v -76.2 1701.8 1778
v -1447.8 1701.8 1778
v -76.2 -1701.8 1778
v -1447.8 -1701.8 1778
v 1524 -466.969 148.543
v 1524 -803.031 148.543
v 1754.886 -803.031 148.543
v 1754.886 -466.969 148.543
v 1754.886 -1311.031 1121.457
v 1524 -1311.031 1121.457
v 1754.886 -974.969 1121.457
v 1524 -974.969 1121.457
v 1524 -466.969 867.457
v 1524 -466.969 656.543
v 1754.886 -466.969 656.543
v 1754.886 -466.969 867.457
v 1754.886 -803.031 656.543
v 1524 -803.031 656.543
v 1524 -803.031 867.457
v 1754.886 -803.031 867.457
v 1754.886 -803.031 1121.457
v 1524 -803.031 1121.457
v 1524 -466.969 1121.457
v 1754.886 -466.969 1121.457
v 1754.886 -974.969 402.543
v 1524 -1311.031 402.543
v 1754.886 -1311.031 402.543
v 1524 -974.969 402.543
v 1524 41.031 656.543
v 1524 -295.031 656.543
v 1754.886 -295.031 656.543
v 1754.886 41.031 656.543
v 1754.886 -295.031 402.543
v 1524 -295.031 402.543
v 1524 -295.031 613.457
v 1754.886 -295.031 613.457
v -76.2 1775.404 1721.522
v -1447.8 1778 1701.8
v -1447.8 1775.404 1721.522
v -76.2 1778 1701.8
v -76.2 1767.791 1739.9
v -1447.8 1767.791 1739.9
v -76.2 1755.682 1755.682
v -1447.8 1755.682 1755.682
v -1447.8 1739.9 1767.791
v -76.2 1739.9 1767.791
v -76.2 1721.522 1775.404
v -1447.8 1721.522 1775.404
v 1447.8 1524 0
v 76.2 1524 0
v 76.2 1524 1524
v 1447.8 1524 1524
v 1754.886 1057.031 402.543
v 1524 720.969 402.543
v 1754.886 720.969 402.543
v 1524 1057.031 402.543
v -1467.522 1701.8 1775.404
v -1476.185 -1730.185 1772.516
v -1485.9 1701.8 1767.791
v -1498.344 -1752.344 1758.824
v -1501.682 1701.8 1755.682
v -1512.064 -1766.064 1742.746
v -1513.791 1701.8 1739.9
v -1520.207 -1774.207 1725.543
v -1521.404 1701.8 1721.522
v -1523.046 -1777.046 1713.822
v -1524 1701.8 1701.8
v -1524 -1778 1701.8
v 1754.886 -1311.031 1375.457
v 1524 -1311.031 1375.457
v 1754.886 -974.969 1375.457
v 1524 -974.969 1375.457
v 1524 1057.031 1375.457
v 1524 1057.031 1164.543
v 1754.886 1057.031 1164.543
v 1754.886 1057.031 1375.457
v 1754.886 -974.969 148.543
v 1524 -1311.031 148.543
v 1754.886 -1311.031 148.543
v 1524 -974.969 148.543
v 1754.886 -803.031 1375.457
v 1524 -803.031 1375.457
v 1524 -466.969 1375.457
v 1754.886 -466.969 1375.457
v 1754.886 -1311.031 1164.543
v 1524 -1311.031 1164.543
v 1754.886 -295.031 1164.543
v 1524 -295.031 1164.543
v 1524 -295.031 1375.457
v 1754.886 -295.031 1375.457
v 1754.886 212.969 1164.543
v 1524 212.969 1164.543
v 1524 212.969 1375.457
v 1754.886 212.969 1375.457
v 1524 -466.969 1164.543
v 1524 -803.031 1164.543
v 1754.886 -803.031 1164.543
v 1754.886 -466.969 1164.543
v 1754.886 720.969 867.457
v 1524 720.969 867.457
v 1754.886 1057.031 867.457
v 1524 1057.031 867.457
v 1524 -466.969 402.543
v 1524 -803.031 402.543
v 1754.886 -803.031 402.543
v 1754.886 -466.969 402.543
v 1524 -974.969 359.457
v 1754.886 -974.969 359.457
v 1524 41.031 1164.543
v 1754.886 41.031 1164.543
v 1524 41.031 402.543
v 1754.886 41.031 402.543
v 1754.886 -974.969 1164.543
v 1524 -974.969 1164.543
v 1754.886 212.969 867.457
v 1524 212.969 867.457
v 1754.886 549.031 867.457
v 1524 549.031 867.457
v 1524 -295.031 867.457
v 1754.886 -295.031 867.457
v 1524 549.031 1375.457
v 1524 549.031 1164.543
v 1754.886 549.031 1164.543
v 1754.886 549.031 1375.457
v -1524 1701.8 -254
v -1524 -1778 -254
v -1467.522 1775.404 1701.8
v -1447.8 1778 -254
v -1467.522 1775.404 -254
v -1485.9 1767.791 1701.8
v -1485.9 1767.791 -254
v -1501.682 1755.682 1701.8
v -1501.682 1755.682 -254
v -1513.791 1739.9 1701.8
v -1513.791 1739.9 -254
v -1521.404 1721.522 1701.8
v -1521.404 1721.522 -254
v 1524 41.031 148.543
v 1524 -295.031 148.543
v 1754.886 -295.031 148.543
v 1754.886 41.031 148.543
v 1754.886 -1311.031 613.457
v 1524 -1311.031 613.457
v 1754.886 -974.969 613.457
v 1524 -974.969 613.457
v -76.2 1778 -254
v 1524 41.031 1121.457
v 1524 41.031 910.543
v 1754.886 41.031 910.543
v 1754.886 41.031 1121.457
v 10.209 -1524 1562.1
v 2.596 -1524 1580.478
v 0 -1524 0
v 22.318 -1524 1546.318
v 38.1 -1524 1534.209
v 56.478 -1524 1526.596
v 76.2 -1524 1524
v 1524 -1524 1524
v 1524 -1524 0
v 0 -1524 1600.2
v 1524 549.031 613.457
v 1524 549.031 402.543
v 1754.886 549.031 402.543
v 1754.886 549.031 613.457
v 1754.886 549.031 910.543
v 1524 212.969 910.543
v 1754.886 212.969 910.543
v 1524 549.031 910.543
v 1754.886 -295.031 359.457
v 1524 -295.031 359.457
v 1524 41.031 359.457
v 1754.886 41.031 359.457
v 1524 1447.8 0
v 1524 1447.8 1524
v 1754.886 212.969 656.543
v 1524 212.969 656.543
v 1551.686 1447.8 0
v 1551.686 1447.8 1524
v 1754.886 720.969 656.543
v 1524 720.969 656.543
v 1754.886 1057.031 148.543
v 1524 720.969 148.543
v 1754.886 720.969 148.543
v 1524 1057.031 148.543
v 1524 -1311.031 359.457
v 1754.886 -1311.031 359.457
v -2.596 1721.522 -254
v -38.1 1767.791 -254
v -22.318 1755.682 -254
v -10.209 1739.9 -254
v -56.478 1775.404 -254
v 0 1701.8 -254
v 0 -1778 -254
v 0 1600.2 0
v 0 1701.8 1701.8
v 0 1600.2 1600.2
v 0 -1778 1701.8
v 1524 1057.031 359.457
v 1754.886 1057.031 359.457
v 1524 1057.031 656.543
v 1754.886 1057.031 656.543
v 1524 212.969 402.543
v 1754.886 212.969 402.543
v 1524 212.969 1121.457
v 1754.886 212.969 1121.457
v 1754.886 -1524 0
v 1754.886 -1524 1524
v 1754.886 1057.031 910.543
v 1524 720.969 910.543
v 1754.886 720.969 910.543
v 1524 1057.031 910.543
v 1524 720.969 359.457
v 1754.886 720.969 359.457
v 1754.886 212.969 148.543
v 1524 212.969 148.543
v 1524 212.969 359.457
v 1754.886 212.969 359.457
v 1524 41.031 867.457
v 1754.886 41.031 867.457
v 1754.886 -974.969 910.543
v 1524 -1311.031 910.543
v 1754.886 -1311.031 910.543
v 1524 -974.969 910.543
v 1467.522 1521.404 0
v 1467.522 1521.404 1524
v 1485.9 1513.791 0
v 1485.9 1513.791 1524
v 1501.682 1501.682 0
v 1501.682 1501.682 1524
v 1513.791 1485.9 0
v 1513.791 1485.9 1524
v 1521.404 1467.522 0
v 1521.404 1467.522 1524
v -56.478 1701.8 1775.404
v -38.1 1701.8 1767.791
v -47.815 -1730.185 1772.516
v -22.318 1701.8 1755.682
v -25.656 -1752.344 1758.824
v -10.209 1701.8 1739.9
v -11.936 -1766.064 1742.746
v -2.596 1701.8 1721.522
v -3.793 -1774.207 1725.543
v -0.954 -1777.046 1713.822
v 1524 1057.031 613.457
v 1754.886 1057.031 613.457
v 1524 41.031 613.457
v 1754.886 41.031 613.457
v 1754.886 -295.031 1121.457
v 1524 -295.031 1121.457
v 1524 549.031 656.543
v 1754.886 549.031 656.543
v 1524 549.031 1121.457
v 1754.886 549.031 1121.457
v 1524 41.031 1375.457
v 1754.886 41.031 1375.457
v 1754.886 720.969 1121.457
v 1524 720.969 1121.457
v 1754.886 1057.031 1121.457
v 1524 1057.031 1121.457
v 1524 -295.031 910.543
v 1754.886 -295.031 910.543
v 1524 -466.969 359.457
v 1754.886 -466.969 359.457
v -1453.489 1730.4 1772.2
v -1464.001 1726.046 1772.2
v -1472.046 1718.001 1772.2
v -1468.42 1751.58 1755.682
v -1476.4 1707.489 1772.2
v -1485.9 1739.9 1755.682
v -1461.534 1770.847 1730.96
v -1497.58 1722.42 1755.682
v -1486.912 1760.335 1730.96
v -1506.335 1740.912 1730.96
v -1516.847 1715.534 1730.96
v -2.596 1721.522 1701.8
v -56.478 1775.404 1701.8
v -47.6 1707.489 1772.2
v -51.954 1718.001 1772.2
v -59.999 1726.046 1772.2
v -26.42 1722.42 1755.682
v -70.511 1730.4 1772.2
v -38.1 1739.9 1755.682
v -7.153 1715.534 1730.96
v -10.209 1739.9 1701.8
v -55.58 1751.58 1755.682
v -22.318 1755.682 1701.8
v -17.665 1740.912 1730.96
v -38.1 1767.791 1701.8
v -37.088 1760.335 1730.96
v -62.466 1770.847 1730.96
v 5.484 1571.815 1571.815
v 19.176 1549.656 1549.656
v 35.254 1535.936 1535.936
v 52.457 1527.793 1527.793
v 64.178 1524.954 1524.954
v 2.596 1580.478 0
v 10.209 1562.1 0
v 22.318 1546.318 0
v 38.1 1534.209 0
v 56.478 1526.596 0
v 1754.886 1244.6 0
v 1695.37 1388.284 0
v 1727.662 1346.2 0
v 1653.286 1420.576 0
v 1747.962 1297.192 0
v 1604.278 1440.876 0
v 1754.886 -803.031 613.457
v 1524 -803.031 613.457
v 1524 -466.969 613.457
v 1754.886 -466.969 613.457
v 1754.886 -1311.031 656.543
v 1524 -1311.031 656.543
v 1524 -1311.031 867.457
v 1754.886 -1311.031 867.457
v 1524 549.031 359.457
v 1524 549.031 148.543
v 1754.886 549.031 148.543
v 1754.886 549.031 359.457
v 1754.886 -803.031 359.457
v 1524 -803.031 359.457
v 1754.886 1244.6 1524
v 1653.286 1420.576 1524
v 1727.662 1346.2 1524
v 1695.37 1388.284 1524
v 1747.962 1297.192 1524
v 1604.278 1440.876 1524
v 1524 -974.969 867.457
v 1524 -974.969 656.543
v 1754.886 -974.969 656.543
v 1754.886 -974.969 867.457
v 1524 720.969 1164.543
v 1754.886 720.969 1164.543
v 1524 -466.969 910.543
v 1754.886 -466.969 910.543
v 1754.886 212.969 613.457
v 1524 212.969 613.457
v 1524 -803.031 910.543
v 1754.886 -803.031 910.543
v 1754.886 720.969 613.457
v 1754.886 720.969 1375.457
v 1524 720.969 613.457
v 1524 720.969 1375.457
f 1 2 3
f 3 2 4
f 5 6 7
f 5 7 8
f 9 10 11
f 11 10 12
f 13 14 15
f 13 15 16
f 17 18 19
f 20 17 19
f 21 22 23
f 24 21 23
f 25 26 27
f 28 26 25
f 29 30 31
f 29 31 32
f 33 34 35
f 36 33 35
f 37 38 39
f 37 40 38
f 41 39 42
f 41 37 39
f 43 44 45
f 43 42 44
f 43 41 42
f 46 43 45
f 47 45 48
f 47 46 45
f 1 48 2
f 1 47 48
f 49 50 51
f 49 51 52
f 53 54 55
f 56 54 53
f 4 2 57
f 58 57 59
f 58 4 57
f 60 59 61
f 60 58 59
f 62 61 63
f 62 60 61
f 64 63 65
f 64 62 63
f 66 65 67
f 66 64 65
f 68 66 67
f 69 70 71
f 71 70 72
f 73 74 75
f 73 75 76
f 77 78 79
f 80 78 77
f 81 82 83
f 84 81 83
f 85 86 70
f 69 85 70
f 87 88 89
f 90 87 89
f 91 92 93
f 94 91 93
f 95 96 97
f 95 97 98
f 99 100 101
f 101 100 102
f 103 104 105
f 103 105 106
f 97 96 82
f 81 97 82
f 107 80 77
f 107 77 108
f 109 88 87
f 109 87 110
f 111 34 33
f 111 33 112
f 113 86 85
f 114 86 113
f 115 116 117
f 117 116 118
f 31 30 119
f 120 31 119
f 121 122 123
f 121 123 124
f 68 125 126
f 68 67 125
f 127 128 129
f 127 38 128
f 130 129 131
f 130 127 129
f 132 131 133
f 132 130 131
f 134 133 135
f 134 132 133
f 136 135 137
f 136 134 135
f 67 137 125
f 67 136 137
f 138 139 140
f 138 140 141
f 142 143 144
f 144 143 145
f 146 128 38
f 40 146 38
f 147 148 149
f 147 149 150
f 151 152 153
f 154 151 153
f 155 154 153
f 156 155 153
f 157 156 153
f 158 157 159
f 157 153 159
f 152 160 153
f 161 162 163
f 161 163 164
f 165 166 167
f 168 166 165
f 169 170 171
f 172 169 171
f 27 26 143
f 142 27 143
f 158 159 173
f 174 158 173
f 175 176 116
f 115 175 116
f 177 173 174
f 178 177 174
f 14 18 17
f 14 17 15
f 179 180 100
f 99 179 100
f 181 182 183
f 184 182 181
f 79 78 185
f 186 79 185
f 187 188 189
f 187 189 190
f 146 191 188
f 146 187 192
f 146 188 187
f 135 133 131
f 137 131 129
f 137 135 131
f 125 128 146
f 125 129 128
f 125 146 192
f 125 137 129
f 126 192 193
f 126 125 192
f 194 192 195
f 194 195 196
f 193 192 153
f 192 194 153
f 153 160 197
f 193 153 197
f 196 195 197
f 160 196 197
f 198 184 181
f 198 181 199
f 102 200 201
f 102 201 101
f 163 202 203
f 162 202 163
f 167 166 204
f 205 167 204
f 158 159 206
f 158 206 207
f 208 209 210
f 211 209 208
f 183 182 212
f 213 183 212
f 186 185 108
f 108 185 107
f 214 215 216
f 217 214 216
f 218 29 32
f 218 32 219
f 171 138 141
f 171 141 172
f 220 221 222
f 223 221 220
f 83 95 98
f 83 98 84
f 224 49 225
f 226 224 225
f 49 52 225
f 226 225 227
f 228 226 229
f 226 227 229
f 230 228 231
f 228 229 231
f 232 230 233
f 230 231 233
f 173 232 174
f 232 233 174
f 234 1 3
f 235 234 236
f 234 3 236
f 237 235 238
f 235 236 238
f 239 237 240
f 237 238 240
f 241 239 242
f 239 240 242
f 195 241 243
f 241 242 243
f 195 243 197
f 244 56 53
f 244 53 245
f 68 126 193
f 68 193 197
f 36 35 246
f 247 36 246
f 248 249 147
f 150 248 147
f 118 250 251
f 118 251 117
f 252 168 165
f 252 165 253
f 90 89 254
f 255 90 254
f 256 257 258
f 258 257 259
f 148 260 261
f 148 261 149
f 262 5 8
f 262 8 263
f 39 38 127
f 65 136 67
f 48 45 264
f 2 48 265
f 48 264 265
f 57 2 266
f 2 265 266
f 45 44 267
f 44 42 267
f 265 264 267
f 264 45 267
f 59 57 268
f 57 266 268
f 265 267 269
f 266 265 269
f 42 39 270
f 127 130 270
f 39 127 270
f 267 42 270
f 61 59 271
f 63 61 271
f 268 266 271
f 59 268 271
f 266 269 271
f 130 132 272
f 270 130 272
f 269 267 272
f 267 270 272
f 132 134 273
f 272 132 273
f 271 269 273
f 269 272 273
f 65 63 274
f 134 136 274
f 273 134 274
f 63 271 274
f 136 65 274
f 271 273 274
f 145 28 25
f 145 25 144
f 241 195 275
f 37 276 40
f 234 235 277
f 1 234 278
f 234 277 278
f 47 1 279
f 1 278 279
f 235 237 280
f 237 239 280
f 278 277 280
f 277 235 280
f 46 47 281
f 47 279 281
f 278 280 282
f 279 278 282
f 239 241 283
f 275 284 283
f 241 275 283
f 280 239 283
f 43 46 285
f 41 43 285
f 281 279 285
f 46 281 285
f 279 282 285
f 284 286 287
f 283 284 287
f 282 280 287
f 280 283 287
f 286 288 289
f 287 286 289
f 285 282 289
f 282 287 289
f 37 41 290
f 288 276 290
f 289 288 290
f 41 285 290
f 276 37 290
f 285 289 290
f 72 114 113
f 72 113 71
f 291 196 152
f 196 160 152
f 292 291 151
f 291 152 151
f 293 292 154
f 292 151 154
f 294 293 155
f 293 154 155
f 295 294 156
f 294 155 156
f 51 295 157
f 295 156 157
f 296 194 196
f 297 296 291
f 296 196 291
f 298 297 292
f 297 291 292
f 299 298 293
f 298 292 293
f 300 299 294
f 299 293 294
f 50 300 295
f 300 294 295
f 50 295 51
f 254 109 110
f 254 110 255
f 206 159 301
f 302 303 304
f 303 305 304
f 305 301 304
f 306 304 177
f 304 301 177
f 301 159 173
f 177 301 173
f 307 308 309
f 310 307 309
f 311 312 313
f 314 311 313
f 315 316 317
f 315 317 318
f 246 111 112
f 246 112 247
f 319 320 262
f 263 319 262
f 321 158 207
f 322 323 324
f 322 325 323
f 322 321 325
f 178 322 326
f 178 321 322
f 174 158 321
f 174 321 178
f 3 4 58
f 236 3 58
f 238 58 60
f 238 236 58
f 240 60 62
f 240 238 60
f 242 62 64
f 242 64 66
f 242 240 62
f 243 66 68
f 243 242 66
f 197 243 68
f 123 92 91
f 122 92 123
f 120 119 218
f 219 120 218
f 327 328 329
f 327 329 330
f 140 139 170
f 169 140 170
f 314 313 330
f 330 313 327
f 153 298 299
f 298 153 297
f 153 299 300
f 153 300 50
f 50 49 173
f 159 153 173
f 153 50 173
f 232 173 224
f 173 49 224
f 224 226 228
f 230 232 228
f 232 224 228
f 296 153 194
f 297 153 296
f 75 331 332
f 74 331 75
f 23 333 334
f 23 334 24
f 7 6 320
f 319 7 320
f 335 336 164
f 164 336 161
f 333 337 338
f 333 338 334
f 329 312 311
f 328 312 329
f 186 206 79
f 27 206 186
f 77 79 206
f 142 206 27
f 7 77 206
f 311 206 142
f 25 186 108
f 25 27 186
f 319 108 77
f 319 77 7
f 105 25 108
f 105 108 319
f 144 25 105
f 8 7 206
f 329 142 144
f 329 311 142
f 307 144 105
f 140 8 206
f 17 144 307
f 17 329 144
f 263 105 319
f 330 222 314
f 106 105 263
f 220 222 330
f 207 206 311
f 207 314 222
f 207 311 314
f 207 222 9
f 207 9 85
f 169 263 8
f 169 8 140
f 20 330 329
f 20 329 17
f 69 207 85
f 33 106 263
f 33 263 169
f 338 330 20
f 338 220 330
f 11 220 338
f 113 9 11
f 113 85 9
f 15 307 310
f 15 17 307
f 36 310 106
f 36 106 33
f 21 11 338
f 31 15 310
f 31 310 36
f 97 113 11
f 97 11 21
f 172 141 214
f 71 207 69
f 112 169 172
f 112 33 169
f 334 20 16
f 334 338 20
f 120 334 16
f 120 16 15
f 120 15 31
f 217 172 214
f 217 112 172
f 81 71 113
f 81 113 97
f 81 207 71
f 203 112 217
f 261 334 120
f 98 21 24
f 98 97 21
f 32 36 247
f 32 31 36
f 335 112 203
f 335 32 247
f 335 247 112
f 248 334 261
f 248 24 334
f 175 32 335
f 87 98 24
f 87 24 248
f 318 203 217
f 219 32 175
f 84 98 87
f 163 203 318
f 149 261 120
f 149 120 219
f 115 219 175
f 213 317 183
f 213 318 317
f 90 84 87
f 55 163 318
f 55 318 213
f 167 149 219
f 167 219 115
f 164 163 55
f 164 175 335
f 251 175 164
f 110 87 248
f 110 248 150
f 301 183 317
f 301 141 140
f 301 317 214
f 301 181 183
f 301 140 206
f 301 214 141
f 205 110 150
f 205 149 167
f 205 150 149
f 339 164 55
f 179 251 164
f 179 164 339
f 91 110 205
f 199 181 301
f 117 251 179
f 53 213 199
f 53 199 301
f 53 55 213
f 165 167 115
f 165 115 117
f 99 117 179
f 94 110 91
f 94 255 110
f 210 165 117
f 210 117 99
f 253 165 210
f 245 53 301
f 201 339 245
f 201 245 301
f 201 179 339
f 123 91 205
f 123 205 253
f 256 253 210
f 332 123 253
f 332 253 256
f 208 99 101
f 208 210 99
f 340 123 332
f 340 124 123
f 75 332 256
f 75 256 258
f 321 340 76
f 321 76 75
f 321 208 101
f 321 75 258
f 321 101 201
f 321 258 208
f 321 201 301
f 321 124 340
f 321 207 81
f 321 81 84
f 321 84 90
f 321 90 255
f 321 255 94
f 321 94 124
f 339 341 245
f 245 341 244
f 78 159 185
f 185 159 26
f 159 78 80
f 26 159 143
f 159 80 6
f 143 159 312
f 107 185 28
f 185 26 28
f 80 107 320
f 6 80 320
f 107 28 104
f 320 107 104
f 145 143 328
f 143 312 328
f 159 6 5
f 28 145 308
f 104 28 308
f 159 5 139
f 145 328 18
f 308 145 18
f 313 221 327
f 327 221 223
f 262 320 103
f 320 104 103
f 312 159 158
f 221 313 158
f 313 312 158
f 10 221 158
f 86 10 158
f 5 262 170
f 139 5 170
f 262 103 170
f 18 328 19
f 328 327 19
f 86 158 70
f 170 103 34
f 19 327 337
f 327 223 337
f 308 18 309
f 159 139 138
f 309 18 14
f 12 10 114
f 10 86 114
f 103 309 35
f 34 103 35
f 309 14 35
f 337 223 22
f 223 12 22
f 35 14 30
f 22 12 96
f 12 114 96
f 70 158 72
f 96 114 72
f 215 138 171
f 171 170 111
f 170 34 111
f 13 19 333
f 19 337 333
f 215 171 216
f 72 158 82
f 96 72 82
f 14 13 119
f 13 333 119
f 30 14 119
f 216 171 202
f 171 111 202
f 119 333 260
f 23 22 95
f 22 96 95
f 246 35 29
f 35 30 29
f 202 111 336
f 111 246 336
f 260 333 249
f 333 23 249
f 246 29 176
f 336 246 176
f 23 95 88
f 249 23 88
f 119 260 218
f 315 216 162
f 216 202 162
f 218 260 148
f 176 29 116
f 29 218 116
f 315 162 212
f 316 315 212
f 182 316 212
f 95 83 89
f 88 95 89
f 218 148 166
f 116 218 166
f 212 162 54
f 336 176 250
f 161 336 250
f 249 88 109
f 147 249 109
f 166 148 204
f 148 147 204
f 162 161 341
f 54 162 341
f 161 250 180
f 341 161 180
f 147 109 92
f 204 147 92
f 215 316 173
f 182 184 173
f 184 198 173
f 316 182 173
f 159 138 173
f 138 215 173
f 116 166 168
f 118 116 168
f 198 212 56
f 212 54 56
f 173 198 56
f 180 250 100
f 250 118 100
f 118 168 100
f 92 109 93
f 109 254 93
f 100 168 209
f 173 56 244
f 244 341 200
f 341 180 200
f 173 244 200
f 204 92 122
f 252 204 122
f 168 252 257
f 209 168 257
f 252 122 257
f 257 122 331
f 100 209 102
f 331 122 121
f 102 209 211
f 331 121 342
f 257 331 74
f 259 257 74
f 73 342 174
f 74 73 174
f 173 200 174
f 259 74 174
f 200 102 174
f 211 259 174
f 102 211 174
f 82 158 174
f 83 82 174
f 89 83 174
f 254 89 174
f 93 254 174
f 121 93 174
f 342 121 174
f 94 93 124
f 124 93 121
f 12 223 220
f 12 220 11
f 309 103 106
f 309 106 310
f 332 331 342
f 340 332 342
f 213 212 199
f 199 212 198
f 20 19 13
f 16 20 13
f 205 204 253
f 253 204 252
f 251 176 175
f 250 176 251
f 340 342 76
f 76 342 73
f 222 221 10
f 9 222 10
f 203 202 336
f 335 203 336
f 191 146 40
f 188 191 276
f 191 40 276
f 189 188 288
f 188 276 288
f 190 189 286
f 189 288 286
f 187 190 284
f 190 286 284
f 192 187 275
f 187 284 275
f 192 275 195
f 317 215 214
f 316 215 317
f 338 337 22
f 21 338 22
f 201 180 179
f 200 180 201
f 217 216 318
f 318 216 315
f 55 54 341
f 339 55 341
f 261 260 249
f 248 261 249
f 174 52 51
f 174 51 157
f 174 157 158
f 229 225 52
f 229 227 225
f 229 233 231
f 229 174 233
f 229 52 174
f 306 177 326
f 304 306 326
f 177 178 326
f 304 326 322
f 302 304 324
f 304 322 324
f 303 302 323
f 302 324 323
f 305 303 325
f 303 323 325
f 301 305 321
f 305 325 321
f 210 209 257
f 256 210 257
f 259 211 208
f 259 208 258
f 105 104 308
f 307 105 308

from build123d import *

# Parameters (mm, degrees)
F0_W     = 3048
F0_H     = 3048
F1_DEPTH = 1524
F2_W     = 3556
F2_H     = 2032
F2_W_2   = 3048
F2_H_2   = 1524
F3_DEPTH = 1524
F4_R     = 76.2
F5_W     = 2971.8
F5_H     = 1524
F5_W_2   = 336.062908
F5_H_2   = 210.914134
F6_DEPTH = 230.886
F7_R     = 203.2


with BuildPart() as f1:
    # F0 (on Top) → F1 (new body)
    with BuildSketch(Plane.XY):
        Rectangle(F0_W, F0_H)
    extrude(amount=F1_DEPTH)

    # F2 (on face) → F3 (join)
    with BuildSketch(Plane(origin=(-1524, 0, 0), x_dir=(0, -1, 0), z_dir=(-1, 0, 0))):
        with Locations((0, 762)):
            Rectangle(F2_W, F2_H)
        with Locations((0, 762)):
            Rectangle(F2_W_2, F2_H_2, mode=Mode.SUBTRACT)
    extrude(amount=-F3_DEPTH)

    # F4
    f4_edges = [f1.edges().sort_by_distance(p)[0] for p in [
        (1524, 1524, 762),
        (0, 1524, 762),
        (0, 1778, 762),
        (-1524, 1778, 762),
        (0, 0, 1778),
        (0, 0, 1524),
        (-762, -1778, 1778),
        (-762, 1778, 1778),
        (-1524, 0, 1778),
    ]]
    fillet(f4_edges, radius=F4_R)


with BuildPart() as f6:
    # F5 (on face) → F6 (new body)
    with BuildSketch(Plane.YZ.offset(1524)):
        with Locations((-38.1, 762)):
            Rectangle(F5_W, F5_H)
        with Locations((-1143, 254)):
            Rectangle(F5_W_2, F5_H_2, mode=Mode.SUBTRACT)
        with Locations((-635, 254)):
            Rectangle(F5_W_2, F5_H_2, mode=Mode.SUBTRACT)
        with Locations((-127, 254)):
            Rectangle(F5_W_2, F5_H_2, mode=Mode.SUBTRACT)
        with Locations((-1143, 508)):
            Rectangle(F5_W_2, F5_H_2, mode=Mode.SUBTRACT)
        with Locations((-635, 508)):
            Rectangle(F5_W_2, F5_H_2, mode=Mode.SUBTRACT)
        with Locations((-127, 508)):
            Rectangle(F5_W_2, F5_H_2, mode=Mode.SUBTRACT)
        with Locations((381, 254)):
            Rectangle(F5_W_2, F5_H_2, mode=Mode.SUBTRACT)
        with Locations((889, 254)):
            Rectangle(F5_W_2, F5_H_2, mode=Mode.SUBTRACT)
        with Locations((381, 508)):
            Rectangle(F5_W_2, F5_H_2, mode=Mode.SUBTRACT)
        with Locations((889, 508)):
            Rectangle(F5_W_2, F5_H_2, mode=Mode.SUBTRACT)
        with Locations((-1143, 762)):
            Rectangle(F5_W_2, F5_H_2, mode=Mode.SUBTRACT)
        with Locations((-1143, 1016)):
            Rectangle(F5_W_2, F5_H_2, mode=Mode.SUBTRACT)
        with Locations((-635, 762)):
            Rectangle(F5_W_2, F5_H_2, mode=Mode.SUBTRACT)
        with Locations((-127, 762)):
            Rectangle(F5_W_2, F5_H_2, mode=Mode.SUBTRACT)
        with Locations((-635, 1016)):
            Rectangle(F5_W_2, F5_H_2, mode=Mode.SUBTRACT)
        with Locations((-127, 1016)):
            Rectangle(F5_W_2, F5_H_2, mode=Mode.SUBTRACT)
        with Locations((-1143, 1270)):
            Rectangle(F5_W_2, F5_H_2, mode=Mode.SUBTRACT)
        with Locations((-635, 1270)):
            Rectangle(F5_W_2, F5_H_2, mode=Mode.SUBTRACT)
        with Locations((-127, 1270)):
            Rectangle(F5_W_2, F5_H_2, mode=Mode.SUBTRACT)
        with Locations((381, 762)):
            Rectangle(F5_W_2, F5_H_2, mode=Mode.SUBTRACT)
        with Locations((381, 1016)):
            Rectangle(F5_W_2, F5_H_2, mode=Mode.SUBTRACT)
        with Locations((889, 762)):
            Rectangle(F5_W_2, F5_H_2, mode=Mode.SUBTRACT)
        with Locations((889, 1016)):
            Rectangle(F5_W_2, F5_H_2, mode=Mode.SUBTRACT)
        with Locations((381, 1270)):
            Rectangle(F5_W_2, F5_H_2, mode=Mode.SUBTRACT)
        with Locations((889, 1270)):
            Rectangle(F5_W_2, F5_H_2, mode=Mode.SUBTRACT)
    extrude(amount=F6_DEPTH)

    # F7
    f7_edges = [f6.edges().sort_by_distance(p)[0] for p in [
        (1754.886, 1447.8, 762),
    ]]
    fillet(f7_edges, radius=F7_R)


solid = Compound([f1.part, f6.part])
